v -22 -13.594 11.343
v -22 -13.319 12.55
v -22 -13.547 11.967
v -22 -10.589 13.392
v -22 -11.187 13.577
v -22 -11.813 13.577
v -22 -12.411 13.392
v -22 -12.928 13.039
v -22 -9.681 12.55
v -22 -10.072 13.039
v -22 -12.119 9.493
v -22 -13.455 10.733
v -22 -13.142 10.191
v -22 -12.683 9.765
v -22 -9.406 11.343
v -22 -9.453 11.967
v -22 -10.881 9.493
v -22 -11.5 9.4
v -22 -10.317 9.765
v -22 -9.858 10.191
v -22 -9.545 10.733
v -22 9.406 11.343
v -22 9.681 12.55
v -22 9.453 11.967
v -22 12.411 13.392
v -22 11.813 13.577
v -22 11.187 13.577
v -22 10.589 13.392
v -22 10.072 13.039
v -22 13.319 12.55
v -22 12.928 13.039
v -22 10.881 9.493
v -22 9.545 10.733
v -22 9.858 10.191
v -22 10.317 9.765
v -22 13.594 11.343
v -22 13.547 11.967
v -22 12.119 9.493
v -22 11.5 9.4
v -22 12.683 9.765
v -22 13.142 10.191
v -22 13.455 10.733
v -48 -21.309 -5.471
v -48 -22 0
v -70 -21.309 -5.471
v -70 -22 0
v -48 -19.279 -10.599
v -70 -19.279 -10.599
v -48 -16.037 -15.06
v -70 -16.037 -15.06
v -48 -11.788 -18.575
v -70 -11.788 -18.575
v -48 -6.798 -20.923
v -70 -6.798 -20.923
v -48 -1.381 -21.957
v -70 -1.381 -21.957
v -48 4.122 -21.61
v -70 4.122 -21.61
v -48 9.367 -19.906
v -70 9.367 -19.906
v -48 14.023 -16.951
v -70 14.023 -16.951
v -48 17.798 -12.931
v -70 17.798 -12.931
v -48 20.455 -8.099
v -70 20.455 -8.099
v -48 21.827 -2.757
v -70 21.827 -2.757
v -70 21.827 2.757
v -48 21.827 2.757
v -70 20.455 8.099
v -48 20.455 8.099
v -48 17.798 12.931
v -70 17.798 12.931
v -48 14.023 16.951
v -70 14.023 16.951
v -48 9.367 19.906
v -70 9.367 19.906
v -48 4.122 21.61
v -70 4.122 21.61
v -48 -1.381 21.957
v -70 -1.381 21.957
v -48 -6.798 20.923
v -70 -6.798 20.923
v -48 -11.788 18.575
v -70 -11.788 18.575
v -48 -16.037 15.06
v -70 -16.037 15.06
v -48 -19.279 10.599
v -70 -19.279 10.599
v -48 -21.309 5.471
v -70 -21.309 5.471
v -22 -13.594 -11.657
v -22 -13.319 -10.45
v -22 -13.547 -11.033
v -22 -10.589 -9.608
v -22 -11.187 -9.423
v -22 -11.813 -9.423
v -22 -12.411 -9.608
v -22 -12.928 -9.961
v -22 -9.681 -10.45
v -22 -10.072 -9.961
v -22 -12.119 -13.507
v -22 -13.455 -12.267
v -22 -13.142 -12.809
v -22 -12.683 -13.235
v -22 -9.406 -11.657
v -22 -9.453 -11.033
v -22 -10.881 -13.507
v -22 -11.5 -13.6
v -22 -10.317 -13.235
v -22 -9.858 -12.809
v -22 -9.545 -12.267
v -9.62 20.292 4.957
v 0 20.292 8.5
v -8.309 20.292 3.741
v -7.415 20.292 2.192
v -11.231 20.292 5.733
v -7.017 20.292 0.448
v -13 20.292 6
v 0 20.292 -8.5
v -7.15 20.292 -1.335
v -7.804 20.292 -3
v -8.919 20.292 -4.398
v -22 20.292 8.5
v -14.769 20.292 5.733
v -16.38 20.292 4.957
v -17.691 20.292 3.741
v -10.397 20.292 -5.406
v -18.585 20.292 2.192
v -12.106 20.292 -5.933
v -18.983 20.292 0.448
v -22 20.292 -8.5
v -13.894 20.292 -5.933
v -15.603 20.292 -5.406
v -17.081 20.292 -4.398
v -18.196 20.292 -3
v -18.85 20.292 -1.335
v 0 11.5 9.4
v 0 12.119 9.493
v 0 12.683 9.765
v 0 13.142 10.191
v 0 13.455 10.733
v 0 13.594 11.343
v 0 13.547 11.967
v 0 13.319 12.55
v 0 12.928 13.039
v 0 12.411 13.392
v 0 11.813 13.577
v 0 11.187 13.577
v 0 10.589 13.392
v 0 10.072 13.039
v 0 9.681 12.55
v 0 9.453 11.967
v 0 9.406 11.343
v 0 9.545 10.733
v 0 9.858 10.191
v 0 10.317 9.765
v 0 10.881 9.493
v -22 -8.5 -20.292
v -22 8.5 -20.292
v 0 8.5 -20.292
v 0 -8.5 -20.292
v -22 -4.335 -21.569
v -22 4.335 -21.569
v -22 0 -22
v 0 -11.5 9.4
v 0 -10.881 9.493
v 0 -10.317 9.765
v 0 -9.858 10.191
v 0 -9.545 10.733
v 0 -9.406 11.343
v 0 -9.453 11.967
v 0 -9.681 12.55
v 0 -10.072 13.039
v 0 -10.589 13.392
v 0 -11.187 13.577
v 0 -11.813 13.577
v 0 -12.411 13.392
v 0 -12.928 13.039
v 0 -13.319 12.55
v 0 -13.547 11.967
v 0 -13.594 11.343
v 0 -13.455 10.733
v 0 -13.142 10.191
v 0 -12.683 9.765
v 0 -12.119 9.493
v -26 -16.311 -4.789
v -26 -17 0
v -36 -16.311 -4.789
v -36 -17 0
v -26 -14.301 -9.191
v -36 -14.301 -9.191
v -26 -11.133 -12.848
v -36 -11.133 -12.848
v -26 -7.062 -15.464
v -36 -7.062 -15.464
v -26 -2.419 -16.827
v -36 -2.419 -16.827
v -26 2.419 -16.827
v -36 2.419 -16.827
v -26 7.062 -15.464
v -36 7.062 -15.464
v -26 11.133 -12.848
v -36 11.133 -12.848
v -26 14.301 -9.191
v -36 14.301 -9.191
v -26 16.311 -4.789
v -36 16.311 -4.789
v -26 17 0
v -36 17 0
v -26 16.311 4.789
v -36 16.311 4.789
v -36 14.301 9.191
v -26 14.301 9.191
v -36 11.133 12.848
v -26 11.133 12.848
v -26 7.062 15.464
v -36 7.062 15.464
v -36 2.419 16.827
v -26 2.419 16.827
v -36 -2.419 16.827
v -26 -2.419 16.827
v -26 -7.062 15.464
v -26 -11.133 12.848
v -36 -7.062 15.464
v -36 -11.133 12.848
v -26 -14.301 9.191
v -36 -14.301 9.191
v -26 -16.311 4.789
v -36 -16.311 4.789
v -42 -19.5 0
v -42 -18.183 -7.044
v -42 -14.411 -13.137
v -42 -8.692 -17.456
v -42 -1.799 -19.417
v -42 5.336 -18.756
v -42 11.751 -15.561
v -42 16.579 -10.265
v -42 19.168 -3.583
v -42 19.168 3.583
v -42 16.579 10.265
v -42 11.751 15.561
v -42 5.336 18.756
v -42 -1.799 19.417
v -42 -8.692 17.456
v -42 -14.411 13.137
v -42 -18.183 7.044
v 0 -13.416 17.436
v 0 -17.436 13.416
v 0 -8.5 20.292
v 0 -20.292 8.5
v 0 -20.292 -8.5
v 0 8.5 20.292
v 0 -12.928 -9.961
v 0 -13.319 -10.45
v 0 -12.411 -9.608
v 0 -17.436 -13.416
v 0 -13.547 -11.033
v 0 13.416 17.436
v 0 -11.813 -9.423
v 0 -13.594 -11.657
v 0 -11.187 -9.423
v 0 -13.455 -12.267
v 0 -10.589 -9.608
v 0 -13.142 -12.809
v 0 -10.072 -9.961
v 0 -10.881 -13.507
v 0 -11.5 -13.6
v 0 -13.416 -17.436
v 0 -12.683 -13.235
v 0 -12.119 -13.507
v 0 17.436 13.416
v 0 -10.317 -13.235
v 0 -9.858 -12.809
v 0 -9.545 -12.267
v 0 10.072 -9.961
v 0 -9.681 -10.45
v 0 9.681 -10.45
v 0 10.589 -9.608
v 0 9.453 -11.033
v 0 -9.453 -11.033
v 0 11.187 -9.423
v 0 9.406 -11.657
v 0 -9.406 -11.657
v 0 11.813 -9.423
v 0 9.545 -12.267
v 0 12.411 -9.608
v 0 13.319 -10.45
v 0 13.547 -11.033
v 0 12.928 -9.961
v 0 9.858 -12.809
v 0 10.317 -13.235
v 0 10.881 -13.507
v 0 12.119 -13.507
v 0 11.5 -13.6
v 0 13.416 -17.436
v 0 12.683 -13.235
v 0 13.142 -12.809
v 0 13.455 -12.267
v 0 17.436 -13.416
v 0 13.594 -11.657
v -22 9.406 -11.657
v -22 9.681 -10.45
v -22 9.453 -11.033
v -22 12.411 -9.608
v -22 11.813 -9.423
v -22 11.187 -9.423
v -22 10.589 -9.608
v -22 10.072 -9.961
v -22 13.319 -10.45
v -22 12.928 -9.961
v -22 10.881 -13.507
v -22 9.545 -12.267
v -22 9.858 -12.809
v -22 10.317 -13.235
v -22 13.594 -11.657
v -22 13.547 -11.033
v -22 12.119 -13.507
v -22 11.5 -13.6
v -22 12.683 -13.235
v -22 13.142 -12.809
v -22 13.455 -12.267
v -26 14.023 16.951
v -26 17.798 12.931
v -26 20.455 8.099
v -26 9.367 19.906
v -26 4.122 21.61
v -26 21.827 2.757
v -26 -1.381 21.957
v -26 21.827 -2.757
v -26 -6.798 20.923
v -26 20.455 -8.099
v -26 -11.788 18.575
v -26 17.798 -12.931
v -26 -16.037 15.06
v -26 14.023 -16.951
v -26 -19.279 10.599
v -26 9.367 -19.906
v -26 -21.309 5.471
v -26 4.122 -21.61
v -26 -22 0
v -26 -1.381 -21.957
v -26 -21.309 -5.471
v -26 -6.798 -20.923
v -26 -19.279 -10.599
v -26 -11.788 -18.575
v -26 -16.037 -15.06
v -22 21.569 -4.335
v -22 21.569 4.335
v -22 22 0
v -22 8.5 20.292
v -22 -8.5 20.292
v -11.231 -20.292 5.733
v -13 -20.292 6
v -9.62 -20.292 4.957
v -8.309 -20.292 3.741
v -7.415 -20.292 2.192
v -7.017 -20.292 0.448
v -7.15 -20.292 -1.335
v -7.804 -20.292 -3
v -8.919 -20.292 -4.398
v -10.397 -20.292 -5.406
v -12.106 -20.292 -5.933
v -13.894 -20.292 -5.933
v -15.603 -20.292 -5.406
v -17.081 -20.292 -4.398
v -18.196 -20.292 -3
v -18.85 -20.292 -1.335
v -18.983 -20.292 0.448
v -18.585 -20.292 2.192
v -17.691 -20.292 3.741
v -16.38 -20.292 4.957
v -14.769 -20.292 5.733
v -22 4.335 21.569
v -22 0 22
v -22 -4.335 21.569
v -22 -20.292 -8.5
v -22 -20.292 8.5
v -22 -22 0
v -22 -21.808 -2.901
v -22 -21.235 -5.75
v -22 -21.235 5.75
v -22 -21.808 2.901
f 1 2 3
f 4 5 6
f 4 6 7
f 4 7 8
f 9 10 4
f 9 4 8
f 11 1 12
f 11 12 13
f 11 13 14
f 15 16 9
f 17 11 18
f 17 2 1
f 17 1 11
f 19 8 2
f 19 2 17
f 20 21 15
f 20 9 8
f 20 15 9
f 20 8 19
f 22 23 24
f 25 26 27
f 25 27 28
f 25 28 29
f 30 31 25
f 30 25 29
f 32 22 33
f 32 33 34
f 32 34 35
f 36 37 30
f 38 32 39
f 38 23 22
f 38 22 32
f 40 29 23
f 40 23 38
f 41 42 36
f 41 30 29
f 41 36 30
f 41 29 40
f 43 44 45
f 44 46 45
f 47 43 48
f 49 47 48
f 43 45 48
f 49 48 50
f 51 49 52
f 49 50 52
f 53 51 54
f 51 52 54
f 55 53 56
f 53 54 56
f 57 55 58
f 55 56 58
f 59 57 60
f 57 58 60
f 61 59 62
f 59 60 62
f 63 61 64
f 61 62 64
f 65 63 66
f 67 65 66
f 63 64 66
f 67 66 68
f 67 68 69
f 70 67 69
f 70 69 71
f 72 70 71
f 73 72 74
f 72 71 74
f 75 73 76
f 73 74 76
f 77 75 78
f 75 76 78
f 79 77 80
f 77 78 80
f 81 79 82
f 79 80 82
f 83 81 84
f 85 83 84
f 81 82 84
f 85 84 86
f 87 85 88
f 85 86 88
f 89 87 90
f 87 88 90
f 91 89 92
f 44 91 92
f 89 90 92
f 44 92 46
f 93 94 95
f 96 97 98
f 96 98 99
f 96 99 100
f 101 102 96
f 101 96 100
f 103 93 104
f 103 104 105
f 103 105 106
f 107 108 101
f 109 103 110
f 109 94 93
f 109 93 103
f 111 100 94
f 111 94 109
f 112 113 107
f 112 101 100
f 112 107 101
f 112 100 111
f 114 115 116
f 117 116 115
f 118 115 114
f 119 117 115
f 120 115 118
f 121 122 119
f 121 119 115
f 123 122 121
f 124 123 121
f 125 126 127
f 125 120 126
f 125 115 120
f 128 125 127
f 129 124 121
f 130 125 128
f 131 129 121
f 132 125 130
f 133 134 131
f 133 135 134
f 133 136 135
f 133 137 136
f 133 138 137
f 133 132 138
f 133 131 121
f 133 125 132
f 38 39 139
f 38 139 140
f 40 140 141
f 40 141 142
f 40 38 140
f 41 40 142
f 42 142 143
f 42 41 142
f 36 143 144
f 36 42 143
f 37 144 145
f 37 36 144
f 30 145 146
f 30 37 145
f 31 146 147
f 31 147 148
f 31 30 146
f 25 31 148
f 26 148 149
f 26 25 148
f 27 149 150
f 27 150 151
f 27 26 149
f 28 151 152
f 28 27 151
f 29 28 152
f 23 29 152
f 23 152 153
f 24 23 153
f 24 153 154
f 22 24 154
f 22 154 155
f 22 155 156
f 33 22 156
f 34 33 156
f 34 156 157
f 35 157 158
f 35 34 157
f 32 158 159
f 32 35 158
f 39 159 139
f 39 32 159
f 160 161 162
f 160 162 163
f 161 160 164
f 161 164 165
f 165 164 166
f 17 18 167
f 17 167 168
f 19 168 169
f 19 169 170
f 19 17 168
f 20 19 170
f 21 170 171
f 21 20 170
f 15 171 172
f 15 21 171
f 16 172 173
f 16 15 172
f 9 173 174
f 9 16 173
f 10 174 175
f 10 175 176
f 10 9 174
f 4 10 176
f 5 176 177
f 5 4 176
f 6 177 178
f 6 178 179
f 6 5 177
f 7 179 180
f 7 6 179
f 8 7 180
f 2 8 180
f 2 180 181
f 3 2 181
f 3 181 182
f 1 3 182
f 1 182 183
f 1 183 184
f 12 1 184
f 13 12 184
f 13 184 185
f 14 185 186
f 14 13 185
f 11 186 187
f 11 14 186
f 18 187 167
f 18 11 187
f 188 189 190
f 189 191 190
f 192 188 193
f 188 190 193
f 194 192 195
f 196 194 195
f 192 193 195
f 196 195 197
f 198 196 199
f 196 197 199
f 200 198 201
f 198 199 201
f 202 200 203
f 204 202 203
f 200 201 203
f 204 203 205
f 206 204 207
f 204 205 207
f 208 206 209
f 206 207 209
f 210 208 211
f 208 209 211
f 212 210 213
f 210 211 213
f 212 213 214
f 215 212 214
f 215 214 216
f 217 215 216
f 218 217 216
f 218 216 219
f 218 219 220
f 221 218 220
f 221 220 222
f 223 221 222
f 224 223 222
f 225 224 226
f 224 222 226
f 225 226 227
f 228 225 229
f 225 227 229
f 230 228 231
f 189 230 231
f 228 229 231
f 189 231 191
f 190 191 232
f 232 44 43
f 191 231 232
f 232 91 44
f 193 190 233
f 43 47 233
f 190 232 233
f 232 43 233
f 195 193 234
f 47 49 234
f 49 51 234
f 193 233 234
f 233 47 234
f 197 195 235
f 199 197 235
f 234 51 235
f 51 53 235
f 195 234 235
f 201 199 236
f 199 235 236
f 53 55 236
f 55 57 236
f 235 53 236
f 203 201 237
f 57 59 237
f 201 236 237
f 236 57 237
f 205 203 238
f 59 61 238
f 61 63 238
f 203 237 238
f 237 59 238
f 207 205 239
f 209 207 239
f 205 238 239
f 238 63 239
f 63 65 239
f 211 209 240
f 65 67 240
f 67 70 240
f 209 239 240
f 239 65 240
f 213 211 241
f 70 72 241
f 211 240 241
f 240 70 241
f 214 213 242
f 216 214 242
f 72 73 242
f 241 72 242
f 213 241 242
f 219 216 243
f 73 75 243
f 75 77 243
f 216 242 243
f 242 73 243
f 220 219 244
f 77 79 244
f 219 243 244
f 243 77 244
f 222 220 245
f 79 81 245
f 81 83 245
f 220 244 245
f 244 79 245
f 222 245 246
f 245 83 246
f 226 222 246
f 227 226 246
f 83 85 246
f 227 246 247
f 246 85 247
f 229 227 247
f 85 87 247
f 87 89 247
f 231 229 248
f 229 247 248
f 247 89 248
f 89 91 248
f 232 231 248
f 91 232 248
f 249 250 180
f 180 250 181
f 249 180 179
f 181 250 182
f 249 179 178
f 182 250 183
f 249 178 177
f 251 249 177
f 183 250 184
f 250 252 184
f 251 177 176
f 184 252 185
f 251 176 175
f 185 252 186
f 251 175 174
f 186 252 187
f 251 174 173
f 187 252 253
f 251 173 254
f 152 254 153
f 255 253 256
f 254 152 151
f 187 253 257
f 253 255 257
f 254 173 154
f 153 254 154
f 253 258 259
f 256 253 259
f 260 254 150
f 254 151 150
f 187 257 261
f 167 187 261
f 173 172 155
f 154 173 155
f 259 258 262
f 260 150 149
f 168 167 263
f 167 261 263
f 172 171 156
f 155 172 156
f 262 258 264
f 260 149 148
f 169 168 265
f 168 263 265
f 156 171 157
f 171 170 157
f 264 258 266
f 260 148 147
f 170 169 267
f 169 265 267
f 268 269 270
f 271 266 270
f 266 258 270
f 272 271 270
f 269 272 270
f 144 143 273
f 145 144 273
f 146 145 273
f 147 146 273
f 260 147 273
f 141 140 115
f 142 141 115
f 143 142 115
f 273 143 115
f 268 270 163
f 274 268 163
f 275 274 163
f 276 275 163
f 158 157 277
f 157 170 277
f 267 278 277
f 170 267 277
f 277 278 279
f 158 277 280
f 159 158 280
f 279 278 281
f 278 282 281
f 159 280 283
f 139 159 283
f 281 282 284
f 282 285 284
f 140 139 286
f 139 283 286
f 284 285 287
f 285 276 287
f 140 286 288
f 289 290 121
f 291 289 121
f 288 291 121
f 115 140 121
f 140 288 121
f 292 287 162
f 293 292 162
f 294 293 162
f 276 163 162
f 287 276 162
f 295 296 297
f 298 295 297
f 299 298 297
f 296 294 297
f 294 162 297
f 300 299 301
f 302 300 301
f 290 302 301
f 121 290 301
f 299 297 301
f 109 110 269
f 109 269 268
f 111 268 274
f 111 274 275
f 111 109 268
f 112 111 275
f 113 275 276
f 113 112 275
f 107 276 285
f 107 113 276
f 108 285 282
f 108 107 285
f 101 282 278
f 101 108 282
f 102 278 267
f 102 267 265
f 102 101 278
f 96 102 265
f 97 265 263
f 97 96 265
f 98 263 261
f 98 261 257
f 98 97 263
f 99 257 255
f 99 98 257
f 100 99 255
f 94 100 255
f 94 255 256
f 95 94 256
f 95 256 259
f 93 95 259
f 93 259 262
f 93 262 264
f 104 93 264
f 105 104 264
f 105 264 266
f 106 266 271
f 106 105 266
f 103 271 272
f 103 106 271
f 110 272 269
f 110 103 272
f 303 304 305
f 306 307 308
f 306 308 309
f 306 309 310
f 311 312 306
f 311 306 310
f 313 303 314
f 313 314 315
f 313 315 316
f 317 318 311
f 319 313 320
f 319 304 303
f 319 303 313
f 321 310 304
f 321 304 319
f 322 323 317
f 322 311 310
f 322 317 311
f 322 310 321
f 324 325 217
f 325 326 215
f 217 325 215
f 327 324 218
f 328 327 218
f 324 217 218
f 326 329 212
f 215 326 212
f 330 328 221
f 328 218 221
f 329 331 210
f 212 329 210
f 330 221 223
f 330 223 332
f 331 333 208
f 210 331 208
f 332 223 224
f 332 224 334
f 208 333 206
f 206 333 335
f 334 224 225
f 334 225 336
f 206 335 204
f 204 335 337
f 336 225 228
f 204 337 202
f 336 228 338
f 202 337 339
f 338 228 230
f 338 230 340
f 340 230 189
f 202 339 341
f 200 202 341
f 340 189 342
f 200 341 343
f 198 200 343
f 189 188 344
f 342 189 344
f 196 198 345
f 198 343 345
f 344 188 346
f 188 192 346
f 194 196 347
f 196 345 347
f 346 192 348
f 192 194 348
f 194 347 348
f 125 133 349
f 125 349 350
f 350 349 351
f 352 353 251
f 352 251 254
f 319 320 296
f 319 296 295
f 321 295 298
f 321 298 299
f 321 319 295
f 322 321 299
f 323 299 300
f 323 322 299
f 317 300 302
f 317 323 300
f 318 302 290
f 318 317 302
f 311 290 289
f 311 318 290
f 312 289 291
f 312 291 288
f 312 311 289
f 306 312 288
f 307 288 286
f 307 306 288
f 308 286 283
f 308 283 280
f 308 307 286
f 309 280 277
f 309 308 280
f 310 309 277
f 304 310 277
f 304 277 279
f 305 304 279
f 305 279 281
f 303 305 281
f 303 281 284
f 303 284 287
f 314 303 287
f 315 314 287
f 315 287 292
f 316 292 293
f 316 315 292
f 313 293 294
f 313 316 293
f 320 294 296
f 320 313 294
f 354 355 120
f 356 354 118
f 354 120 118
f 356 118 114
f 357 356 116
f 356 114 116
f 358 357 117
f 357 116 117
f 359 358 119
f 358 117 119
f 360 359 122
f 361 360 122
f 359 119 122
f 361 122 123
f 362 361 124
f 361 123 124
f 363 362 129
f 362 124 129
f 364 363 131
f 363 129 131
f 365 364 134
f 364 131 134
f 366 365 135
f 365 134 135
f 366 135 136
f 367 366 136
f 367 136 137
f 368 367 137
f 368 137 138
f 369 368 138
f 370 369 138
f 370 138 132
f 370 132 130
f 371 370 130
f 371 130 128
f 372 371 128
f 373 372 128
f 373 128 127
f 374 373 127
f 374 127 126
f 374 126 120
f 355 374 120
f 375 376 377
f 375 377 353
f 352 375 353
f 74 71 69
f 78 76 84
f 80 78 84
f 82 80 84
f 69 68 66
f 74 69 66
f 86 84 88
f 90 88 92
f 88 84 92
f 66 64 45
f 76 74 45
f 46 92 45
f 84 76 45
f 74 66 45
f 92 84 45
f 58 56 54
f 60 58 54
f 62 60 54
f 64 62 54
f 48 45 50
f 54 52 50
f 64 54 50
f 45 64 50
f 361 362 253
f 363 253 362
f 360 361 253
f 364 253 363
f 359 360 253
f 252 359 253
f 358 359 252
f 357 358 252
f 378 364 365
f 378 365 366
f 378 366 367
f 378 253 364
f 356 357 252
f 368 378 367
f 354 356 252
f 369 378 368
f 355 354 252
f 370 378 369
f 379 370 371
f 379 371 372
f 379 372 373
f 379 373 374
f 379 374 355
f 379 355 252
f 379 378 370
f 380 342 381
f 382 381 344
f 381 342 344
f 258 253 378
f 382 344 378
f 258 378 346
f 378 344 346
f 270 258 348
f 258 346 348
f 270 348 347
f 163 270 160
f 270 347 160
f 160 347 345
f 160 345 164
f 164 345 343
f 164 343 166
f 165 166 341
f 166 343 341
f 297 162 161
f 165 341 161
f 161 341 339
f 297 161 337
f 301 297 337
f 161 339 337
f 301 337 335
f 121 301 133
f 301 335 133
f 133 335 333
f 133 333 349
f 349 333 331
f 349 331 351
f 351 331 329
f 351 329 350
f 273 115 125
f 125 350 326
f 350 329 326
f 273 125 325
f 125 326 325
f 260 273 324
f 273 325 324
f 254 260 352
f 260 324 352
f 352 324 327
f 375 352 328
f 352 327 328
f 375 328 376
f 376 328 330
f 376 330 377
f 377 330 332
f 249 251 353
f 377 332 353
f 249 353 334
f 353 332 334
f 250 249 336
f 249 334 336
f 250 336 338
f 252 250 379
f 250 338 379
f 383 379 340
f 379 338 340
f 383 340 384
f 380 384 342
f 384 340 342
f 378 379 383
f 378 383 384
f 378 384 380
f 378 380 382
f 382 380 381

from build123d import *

# Parameters (mm, degrees)
CUT_EXTRUDE1_START = -22
SKETCH2_R          = 2.1
CUT_EXTRUDE1_DEPTH = 22
CUT_EXTRUDE2_REACH = 86.691
SKETCH3_R          = 6


with BuildPart() as part:
    # Sketch1 → Revolve1 (revolve)
    with BuildSketch(Plane(origin=(0, 0, 0), x_dir=(0, 1, 0), z_dir=(0, 0, 1)), mode=Mode.PRIVATE) as revolve1_sk:
        Polygon((0, 0), (22, 0), (22, 26), (17, 26), (17, 36), (22, 48), (22, 70), (0, 70), align=None)
    revolve(revolve1_sk.sketch.rotate(Axis((-70, 0, 0), (1, 0, 0)), 180), axis=Axis((-70, 0, 0), (1, 0, 0)))

    # Sketch2 → Cut-Extrude1 (cut)
    with BuildSketch(Plane.YZ.offset(CUT_EXTRUDE1_START)):
        with Locations(Location((-11.5, 11.5, 0), (0, 0, 270))):
            Circle(SKETCH2_R)
        with Locations(Location((11.5, 11.5, 0), (0, 0, 270))):
            Circle(SKETCH2_R)
        with Locations(Location((11.5, -11.5, 0), (0, 0, 270))):
            Circle(SKETCH2_R)
        with Locations(Location((-11.5, -11.5, 0), (0, 0, 270))):
            Circle(SKETCH2_R)
        with BuildLine():
            Line((-8.5, 20.291623888), (8.5, 20.291623888))
            ThreePointArc((8.5, 20.291623888), (0, 22), (-8.5, 20.291623888))
        make_face()
        with BuildLine():
            Line((20.291623888, 8.5), (20.291623888, -8.5))
            ThreePointArc((20.291623888, -8.5), (22, 0), (20.291623888, 8.5))
        make_face()
        with BuildLine():
            Line((8.5, -20.291623888), (-8.5, -20.291623888))
            ThreePointArc((-8.5, -20.291623888), (0, -22), (8.5, -20.291623888))
        make_face()
        with BuildLine():
            Line((-20.291623888, -8.5), (-20.291623888, 8.5))
            ThreePointArc((-20.291623888, 8.5), (-22, 0), (-20.291623888, -8.5))
        make_face()
    extrude(amount=CUT_EXTRUDE1_DEPTH, mode=Mode.SUBTRACT)

    # Sketch3 → Cut-Extrude2 (cut, up to next)
    with BuildSketch(Plane(origin=(0, 20.291623888, 0), x_dir=(-1, 0, 0), z_dir=(0, 1, 0)), mode=Mode.PRIVATE) as cut_extrude2_sk1:
        with Locations(Location((13, 0, 0), (0, 0, 90))):
            Circle(SKETCH3_R)
    cut_extrude2_tool1 = extrude(cut_extrude2_sk1.sketch, amount=-CUT_EXTRUDE2_REACH, mode=Mode.PRIVATE) & part.part
    add(cut_extrude2_tool1.solids().sort_by_distance((-13, 20.291624, 0))[0], mode=Mode.SUBTRACT)


solid = part.part
